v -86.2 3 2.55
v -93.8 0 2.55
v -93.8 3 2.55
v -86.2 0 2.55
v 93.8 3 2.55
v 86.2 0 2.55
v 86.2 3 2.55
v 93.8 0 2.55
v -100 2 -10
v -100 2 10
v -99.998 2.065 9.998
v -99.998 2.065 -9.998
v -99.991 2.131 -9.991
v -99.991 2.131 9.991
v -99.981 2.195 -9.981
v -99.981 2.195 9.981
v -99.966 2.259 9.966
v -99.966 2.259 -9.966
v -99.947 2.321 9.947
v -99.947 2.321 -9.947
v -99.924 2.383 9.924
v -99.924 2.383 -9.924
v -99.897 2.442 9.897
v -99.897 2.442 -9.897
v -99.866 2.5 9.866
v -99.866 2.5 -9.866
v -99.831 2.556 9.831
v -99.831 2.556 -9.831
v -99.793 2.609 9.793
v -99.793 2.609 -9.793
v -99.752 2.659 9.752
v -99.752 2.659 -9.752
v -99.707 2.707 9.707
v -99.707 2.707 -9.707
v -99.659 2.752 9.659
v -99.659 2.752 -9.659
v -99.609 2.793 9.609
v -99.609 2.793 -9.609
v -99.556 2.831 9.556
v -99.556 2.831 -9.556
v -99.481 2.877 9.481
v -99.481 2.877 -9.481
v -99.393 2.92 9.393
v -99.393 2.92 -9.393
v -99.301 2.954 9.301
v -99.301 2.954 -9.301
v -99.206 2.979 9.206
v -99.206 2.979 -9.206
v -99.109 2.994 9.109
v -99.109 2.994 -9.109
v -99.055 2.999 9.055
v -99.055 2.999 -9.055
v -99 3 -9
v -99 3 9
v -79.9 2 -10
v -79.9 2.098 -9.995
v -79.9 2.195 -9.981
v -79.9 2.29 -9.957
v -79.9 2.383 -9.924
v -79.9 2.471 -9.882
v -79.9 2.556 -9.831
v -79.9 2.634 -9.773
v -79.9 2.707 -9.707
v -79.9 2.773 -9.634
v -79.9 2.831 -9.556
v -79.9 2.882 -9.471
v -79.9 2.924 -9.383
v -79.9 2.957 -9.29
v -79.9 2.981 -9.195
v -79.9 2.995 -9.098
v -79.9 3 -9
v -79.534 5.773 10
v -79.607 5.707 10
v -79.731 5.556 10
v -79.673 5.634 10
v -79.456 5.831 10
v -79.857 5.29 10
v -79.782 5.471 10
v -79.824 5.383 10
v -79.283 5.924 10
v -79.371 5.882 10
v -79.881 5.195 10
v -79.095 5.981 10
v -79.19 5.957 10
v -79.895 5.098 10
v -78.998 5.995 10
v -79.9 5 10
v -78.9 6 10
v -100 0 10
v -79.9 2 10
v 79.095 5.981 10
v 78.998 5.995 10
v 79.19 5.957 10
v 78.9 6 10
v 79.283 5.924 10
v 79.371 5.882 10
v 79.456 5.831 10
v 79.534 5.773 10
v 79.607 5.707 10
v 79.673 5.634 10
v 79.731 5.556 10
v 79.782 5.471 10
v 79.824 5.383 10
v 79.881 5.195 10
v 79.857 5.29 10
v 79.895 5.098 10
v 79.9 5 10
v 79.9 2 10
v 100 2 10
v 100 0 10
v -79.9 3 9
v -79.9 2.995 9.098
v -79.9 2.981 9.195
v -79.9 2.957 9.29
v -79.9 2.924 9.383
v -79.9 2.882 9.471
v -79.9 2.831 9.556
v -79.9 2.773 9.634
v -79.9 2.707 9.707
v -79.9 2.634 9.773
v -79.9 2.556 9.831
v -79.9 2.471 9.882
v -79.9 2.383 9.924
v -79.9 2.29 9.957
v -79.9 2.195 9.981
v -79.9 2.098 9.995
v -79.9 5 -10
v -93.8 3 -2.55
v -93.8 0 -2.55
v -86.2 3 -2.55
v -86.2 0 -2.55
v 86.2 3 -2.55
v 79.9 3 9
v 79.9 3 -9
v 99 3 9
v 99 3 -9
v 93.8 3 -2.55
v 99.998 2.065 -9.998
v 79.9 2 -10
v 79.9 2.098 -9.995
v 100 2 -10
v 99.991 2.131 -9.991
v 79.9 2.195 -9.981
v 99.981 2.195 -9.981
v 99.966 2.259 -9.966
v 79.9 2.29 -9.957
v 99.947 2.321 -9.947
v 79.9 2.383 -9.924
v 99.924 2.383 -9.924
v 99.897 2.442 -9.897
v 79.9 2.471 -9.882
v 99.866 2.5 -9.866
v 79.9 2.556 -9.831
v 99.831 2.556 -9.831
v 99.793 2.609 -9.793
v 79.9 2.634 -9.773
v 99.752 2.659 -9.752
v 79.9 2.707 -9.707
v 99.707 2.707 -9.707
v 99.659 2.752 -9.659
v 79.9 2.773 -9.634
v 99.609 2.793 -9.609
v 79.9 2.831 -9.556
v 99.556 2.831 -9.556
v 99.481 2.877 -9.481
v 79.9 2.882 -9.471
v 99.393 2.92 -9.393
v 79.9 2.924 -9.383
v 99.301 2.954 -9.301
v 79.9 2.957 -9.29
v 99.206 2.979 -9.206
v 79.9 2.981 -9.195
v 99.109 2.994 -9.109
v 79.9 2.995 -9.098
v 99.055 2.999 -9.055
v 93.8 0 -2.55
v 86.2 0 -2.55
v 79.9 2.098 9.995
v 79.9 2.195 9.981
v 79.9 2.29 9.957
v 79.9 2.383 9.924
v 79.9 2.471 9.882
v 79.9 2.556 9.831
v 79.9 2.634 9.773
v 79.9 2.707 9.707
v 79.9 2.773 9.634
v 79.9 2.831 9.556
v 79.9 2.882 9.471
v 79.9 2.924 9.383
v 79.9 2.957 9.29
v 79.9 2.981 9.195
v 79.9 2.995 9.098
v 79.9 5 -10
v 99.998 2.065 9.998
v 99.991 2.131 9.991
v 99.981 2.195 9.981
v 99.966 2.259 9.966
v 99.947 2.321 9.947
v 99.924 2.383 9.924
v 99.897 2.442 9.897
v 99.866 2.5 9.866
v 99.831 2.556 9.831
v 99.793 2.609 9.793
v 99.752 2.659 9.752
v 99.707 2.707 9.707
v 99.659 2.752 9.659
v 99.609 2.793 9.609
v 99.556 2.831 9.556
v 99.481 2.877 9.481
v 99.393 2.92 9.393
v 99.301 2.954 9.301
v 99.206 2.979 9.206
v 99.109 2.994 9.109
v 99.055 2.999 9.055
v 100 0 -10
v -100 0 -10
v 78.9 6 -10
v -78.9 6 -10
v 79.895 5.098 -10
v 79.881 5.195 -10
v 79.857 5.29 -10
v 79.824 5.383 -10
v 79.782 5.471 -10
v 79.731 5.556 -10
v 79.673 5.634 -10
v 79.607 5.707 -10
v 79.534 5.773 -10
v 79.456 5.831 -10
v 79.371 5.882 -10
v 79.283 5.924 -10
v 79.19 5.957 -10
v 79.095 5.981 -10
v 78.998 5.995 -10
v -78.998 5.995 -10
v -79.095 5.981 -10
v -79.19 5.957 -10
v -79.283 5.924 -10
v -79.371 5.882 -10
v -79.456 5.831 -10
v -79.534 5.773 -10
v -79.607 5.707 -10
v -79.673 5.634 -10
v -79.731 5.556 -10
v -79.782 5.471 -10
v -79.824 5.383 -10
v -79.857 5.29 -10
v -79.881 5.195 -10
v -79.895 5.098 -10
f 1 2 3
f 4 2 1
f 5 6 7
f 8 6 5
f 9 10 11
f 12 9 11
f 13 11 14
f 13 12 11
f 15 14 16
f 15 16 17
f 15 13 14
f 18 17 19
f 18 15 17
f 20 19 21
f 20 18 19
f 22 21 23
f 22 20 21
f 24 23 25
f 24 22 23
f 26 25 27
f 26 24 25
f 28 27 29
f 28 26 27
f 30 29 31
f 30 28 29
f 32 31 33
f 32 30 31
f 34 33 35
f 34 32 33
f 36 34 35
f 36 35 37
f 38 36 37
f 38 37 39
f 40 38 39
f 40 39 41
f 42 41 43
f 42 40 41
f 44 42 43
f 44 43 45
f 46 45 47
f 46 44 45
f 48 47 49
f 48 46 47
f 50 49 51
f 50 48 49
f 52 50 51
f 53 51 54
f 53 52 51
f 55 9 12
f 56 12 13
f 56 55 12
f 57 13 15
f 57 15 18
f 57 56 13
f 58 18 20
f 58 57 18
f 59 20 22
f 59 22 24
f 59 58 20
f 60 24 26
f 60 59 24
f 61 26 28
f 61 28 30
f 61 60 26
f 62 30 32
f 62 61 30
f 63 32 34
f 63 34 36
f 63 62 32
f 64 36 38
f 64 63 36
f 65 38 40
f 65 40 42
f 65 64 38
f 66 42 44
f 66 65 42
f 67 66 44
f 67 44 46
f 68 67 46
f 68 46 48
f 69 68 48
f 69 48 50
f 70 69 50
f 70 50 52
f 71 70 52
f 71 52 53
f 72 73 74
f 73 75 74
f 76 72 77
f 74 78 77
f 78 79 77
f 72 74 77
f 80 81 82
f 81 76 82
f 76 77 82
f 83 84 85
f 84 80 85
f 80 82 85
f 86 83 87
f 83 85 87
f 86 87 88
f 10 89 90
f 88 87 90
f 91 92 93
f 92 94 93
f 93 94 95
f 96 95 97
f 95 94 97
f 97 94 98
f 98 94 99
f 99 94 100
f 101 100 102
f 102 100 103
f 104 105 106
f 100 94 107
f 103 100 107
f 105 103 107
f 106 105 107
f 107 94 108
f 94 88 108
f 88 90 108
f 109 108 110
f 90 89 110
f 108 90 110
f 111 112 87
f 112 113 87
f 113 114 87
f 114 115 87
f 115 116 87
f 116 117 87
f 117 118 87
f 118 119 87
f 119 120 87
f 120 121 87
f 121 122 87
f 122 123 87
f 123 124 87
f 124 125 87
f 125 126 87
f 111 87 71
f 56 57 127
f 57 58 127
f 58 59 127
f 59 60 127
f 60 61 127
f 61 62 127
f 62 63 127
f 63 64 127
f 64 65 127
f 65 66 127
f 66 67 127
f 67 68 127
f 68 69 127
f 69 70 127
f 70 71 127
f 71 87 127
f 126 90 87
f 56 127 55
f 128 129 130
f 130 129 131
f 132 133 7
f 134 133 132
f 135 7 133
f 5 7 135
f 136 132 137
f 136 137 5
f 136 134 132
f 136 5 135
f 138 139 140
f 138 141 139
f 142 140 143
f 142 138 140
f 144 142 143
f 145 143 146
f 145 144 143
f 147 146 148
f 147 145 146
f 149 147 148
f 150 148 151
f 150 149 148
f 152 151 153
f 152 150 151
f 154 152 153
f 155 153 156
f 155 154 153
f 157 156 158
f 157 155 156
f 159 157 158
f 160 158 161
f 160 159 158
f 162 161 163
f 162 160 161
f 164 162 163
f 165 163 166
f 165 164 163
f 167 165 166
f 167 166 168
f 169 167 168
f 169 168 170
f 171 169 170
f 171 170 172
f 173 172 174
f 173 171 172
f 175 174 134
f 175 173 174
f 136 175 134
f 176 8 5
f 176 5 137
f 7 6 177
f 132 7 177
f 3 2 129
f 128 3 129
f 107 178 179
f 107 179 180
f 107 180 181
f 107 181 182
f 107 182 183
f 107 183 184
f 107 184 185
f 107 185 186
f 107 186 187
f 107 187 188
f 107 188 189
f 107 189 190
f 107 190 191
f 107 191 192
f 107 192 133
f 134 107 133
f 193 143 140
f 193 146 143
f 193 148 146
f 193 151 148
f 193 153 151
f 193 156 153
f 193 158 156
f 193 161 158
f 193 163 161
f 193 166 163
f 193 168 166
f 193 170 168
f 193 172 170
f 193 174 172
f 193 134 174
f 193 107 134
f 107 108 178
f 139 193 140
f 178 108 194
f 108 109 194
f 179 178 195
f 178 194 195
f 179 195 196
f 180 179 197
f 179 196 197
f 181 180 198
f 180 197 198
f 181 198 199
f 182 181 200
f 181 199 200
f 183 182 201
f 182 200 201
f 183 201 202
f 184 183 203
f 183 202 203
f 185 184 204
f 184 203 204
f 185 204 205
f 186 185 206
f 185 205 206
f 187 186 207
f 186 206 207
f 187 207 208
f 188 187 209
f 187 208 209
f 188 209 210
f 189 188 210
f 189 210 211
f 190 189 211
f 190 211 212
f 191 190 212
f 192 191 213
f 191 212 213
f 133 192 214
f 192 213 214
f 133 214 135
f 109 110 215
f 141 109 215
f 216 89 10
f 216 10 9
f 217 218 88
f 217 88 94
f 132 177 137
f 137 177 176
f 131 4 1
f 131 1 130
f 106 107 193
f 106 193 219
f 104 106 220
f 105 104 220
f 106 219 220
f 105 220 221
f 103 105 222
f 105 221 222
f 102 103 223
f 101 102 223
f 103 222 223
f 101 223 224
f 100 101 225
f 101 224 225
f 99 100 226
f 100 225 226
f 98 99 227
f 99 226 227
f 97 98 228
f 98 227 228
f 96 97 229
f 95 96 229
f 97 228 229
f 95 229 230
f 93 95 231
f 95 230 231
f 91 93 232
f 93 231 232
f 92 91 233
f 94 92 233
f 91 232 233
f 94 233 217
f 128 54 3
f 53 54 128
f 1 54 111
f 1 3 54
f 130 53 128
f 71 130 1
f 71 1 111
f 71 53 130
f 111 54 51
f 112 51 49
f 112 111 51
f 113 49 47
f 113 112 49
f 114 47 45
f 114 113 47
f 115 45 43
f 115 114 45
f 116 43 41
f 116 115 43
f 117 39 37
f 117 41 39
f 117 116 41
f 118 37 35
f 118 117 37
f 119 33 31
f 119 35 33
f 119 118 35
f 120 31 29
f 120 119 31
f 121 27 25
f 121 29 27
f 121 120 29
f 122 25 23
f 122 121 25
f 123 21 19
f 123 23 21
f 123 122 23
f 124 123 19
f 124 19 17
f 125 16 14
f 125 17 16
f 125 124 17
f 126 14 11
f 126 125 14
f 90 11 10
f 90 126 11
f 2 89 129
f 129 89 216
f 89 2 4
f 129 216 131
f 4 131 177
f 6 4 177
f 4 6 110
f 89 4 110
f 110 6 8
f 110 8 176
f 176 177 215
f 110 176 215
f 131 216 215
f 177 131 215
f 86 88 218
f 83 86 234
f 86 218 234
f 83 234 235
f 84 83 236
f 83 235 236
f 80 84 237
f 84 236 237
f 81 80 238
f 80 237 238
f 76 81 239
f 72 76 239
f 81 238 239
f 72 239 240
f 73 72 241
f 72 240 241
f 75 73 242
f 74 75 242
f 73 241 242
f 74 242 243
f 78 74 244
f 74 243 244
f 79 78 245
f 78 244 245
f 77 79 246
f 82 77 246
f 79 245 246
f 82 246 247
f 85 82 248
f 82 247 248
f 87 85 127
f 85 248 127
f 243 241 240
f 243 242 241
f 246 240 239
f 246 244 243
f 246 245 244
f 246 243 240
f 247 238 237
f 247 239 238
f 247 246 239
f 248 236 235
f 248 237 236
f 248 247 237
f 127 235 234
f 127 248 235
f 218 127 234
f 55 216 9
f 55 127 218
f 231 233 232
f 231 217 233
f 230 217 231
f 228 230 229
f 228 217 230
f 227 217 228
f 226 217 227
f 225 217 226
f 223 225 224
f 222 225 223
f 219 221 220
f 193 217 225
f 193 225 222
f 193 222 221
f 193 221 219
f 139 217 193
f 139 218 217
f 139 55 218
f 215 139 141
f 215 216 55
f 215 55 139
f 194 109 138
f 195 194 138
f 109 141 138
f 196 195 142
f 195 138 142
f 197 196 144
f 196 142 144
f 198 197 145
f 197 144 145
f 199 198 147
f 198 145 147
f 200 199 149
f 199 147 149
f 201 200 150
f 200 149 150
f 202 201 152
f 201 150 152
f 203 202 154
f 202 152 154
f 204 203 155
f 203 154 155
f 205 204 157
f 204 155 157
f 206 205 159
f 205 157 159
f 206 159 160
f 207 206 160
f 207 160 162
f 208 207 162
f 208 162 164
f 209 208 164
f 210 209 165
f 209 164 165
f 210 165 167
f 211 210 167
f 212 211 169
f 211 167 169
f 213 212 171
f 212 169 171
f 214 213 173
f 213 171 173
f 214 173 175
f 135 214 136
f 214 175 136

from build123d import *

# Parameters (mm, degrees)
SKETCH1_W           = 200
SKETCH1_H           = 20
SKETCH1_W_2         = 7.6
SKETCH1_H_2         = 5.1
BOSS_EXTRUDE1_DEPTH = 6
SKETCH2_W           = 20.1
SKETCH2_H           = 20
CUT_EXTRUDE1_DEPTH  = 3
FILLET1_R           = 1


with BuildPart() as part:
    # Sketch1 → Boss-Extrude1 (new body)
    with BuildSketch(Plane(origin=(0, 0, 0), x_dir=(1, 0, 0), z_dir=(0, 1, 0))):
        Rectangle(SKETCH1_W, SKETCH1_H)
        with Locations((-90, 0)):
            Rectangle(SKETCH1_W_2, SKETCH1_H_2, mode=Mode.SUBTRACT)
        with Locations((90, 0)):
            Rectangle(SKETCH1_W_2, SKETCH1_H_2, mode=Mode.SUBTRACT)
    extrude(amount=BOSS_EXTRUDE1_DEPTH)

    # Sketch2 → Cut-Extrude1 (cut)
    with BuildSketch(Plane(origin=(0, 6, 0), x_dir=(1, 0, 0), z_dir=(0, 1, 0))):
        with Locations((-89.95, 0)):
            Rectangle(SKETCH2_W, SKETCH2_H)
        with Locations((89.95, 0)):
            Rectangle(SKETCH2_W, SKETCH2_H)
    extrude(amount=-CUT_EXTRUDE1_DEPTH, mode=Mode.SUBTRACT)

    # Fillet1
    fillet1_edges = [part.edges().sort_by_distance(p)[0] for p in [
        (-100, 3, 0),
        (-89.95, 3, -10),
        (-89.95, 3, 10),
        (-79.9, 6, 0),
        (100, 3, 0),
        (89.95, 3, 10),
        (89.95, 3, -10),
        (79.9, 6, 0),
    ]]
    fillet(fillet1_edges, radius=FILLET1_R)


solid = part.part
